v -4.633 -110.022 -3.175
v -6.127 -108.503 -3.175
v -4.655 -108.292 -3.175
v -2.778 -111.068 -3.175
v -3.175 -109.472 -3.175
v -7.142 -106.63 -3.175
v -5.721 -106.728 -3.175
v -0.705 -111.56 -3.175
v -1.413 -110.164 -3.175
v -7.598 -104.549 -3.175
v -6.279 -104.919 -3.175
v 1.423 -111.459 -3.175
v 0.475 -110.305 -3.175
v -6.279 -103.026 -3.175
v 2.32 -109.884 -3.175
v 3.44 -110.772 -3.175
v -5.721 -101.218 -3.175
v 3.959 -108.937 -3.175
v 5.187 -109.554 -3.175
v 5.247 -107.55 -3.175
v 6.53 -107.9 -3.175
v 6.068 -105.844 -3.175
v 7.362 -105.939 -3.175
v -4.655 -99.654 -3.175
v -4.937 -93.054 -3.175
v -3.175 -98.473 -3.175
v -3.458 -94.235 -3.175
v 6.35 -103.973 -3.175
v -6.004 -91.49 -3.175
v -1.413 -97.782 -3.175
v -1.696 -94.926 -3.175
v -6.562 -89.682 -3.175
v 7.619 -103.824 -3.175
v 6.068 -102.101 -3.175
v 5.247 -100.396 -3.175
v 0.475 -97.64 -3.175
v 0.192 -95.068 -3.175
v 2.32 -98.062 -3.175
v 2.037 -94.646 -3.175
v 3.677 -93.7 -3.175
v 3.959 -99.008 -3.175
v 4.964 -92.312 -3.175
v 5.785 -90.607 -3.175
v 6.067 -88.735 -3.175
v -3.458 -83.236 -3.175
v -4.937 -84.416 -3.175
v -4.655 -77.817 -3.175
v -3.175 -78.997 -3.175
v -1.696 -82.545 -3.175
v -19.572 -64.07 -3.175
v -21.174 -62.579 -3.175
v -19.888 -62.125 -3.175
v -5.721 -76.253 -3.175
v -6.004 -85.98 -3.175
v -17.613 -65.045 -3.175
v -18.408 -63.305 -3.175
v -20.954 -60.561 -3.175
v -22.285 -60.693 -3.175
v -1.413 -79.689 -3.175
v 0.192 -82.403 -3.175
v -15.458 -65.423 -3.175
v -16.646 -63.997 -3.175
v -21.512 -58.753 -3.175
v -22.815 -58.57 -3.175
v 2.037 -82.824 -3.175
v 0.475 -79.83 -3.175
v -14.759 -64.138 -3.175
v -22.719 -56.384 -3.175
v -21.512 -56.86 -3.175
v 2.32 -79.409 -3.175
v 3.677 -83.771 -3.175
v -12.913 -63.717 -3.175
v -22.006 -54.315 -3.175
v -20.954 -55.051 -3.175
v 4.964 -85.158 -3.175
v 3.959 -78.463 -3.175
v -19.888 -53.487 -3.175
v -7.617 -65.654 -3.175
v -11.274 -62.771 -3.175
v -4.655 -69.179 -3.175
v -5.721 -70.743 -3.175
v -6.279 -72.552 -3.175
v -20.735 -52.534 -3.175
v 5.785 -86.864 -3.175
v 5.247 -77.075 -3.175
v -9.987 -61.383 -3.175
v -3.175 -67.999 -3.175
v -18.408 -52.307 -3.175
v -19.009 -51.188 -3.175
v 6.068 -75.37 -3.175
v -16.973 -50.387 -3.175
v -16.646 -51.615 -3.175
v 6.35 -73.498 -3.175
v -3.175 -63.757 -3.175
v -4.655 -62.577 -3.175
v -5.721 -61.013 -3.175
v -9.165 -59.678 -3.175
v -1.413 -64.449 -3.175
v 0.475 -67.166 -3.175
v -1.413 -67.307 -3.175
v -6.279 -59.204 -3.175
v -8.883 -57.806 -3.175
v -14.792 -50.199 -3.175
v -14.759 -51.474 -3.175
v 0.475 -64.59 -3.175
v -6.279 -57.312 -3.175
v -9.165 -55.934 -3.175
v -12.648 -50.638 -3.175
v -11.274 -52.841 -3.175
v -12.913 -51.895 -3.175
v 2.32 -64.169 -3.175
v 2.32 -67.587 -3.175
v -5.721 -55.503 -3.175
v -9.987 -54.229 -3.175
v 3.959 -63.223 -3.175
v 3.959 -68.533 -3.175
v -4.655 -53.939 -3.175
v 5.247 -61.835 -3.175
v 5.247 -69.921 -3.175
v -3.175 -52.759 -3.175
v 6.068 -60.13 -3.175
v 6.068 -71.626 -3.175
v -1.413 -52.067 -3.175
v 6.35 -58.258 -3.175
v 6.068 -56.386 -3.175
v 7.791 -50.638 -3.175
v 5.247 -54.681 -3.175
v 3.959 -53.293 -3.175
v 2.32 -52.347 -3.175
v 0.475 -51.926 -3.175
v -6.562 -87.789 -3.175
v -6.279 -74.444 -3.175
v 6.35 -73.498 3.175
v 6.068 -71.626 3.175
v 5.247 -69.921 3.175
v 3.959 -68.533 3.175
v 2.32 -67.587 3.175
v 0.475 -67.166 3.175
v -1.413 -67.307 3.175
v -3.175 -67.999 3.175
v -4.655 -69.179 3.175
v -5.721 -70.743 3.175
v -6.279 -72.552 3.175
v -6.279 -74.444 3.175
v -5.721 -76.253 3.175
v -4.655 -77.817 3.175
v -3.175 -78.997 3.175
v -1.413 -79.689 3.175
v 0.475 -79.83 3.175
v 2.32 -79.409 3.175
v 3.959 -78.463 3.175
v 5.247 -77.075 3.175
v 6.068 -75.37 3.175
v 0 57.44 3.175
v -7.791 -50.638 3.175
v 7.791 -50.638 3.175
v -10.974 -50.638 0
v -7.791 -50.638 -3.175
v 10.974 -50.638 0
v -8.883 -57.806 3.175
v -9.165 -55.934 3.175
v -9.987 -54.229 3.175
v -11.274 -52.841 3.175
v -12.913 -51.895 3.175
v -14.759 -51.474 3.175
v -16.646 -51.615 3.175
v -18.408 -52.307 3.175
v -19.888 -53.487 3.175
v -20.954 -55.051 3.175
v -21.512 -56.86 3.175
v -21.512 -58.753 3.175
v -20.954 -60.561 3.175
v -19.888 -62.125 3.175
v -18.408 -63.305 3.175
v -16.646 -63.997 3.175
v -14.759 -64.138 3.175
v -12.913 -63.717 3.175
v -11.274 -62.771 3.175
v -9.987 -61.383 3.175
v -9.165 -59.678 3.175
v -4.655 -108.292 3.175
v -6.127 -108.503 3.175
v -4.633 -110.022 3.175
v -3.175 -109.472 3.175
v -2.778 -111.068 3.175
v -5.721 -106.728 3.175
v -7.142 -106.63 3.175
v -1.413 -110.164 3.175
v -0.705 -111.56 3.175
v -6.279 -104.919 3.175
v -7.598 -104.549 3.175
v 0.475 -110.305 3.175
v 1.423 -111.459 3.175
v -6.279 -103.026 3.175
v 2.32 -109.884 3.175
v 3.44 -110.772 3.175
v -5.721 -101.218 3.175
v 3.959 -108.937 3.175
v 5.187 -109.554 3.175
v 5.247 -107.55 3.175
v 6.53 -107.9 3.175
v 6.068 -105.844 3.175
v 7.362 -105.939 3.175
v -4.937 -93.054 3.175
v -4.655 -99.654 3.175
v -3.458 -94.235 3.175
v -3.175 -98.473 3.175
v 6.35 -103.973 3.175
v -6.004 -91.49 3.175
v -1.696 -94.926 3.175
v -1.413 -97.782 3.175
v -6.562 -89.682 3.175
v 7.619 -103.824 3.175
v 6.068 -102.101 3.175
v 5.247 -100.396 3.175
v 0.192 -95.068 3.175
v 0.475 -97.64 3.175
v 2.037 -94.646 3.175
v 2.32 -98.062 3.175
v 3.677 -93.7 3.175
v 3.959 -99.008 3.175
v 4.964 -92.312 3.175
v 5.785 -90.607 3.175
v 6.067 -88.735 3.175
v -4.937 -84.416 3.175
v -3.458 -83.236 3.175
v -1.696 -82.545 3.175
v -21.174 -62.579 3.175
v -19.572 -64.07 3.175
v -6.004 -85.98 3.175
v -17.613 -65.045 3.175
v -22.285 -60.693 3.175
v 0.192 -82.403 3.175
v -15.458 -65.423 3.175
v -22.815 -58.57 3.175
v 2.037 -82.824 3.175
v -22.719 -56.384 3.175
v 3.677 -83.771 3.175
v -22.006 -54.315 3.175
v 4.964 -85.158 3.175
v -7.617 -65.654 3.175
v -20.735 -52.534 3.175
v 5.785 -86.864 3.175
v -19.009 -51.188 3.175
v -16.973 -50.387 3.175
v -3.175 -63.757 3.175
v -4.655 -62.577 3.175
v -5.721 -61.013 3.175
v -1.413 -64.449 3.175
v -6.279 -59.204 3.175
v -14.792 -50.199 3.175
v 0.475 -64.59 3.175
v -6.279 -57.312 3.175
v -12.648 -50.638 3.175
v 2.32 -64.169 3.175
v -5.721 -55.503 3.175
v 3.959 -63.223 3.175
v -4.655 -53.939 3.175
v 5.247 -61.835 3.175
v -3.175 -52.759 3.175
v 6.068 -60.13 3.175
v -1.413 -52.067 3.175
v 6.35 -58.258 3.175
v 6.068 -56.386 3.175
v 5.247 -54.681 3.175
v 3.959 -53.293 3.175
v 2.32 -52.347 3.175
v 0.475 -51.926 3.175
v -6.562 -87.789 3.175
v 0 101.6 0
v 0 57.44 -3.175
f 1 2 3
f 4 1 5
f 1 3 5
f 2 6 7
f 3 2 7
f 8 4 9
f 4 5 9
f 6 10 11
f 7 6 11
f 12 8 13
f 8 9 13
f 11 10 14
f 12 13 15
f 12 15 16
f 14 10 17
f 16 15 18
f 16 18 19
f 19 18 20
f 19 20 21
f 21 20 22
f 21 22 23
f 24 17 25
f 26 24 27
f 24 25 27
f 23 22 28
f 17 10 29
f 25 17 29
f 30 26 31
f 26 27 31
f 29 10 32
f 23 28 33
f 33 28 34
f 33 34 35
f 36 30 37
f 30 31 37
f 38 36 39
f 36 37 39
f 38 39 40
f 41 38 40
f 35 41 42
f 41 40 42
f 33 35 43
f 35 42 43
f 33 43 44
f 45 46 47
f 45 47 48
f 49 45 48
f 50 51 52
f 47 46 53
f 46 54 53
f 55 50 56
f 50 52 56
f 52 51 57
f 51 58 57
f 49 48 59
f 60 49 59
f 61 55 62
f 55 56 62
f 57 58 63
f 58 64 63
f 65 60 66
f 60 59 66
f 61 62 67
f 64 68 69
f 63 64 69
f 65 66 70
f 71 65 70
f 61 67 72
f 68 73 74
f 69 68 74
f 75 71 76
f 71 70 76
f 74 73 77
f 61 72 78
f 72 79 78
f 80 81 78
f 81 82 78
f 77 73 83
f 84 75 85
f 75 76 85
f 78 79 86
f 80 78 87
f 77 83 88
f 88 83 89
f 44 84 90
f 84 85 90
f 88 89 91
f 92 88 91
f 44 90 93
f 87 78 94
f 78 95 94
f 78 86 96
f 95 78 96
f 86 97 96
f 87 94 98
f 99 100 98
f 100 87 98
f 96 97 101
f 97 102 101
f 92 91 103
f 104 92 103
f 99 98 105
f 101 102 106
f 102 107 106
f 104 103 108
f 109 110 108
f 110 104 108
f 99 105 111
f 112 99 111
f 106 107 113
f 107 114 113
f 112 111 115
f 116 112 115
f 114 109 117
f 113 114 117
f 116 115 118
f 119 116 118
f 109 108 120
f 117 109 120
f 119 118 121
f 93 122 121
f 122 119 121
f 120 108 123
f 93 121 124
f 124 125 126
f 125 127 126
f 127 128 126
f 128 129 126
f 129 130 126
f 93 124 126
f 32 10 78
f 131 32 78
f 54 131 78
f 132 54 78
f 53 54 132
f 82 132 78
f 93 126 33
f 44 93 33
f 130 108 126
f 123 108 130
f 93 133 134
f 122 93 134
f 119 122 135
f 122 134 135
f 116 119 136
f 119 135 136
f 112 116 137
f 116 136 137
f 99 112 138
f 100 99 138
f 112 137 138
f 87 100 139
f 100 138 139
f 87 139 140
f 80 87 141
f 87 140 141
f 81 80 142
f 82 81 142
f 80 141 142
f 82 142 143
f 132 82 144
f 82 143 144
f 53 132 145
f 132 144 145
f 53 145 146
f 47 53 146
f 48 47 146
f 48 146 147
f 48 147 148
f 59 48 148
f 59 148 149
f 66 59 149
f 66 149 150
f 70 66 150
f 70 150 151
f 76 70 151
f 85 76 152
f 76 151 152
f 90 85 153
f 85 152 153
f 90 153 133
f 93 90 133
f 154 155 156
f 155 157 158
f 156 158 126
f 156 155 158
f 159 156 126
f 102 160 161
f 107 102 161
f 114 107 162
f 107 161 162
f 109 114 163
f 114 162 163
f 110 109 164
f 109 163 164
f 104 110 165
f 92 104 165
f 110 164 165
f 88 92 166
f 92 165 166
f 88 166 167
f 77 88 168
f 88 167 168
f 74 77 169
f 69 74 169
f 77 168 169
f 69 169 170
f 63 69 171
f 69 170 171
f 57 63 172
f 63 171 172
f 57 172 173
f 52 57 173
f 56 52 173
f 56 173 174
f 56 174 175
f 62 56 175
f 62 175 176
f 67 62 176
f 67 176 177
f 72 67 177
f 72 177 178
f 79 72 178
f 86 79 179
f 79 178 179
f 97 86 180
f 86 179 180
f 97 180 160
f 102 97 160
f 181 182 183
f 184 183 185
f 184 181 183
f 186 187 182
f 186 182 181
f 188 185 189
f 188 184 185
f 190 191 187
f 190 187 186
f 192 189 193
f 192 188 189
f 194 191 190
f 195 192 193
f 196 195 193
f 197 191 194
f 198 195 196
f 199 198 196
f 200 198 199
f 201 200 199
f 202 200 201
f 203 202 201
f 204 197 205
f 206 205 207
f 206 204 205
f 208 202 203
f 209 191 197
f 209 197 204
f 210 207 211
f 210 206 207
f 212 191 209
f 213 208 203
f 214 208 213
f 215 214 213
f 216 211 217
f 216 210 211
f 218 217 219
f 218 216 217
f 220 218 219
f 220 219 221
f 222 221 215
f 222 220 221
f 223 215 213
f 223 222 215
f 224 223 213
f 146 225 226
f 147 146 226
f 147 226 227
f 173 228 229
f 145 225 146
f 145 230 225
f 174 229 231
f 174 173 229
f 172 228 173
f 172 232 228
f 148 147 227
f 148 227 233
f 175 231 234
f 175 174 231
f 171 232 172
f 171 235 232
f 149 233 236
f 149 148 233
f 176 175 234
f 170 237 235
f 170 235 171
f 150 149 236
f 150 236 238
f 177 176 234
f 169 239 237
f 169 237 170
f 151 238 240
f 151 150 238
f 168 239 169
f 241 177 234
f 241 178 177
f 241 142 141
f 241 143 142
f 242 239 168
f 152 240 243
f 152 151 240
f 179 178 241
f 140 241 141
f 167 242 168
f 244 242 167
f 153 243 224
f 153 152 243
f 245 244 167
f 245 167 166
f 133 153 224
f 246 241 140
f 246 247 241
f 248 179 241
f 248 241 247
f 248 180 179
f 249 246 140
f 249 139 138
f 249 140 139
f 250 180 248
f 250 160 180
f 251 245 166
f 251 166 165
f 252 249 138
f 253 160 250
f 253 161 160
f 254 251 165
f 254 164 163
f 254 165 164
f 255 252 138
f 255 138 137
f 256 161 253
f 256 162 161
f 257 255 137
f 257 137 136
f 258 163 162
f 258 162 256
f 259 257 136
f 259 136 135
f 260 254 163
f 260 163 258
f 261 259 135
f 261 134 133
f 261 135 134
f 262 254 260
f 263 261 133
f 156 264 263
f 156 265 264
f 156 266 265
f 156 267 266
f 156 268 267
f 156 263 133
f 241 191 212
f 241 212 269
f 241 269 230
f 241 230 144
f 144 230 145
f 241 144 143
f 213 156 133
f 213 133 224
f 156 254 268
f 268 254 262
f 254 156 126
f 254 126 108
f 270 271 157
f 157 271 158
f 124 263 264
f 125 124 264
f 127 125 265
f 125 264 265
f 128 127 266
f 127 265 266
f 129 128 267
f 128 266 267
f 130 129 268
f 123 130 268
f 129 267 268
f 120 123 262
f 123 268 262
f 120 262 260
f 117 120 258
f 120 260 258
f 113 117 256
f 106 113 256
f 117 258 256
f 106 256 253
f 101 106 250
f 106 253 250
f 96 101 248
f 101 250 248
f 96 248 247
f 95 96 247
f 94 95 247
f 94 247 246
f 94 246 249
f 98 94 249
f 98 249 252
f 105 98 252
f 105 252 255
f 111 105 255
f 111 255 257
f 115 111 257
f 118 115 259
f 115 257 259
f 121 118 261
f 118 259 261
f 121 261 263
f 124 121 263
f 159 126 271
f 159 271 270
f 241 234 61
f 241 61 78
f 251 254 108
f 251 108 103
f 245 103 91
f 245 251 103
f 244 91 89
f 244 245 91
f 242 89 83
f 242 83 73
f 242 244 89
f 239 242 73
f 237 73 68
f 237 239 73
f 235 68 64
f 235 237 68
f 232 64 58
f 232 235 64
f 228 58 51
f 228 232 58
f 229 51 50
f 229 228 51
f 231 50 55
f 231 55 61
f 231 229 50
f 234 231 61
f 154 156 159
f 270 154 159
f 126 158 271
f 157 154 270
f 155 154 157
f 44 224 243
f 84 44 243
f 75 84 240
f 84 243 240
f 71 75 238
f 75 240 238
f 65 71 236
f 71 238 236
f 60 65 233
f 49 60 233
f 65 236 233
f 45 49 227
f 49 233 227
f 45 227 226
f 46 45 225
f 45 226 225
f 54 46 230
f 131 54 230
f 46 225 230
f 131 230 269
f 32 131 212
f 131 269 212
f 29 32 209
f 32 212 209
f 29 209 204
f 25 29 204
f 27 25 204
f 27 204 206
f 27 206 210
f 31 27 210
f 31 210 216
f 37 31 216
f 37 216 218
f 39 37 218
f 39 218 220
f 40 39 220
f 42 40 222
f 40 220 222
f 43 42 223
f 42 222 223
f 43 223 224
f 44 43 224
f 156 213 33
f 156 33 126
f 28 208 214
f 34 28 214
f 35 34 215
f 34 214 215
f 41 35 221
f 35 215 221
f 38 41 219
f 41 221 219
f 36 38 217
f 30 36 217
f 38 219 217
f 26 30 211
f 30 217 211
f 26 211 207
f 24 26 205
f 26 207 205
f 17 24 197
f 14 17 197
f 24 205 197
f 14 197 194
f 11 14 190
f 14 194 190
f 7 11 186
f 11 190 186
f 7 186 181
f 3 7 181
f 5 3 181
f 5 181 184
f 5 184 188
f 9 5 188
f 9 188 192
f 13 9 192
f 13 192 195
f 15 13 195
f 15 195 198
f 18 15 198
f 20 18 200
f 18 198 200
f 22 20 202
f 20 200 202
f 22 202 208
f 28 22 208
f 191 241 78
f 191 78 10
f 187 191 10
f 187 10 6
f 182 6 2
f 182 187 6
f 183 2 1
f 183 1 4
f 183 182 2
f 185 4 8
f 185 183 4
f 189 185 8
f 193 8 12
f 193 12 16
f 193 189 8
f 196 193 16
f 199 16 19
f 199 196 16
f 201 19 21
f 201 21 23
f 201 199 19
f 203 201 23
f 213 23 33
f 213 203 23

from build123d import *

# Parameters (mm, degrees)
F1_DEPTH = 3.175
F2_SIZE  = 3.17499
F3_R     = 6.35
F4_DEPTH = 6.35


# Not quite as in the source:
# - a fillet or chamfer is up to 0.001 mm smaller than in the source, because OpenCascade refuses the exact size
# - ends of sketch curves that miss each other by under 0.0002 mm in the source are joined
# - a feature names something its author has since deleted; it is built from what else it names


with BuildPart() as f1:
    # F0 (on Top) → F1 (new body, symmetric)
    with BuildSketch(Plane.XY):
        Polygon((0, 101.6), (-10.9740330666, -50.6379564073), (10.9740330666, -50.6379564073), align=None)
    extrude(amount=F1_DEPTH, both=True)

    # F2 (size 3.175 in the source; OpenCascade refuses exactly that, so slightly less here)
    f2_edges = [f1.edges().sort_by_distance(p)[0] for p in [
        (5.487017, 25.481022, 3.175),
        (-5.487017, 25.481022, 3.175),
        (5.487017, 25.481022, -3.175),
        (-5.487017, 25.481022, -3.175),
    ]]
    chamfer(f2_edges, length=F2_SIZE)


with BuildPart() as f4:
    # F3 (on face) → F4 (new body)
    with BuildSketch(Plane.XY.offset(3.175)):
        with BuildLine():
            Line((-7.6165116267, -65.6536943669), (-7.5981611835, -104.5492119633))
            ThreePointArc((-7.5981611835, -104.5492119633), (0.3625233188, -111.5840883864), (7.6185574498, -103.8244522658))
            Line((7.6185574498, -103.8244522658), (7.7907947724, -50.6379564073))
            Line((7.7907947724, -50.6379564073), (0, -50.6379564073))
            Line((0, -50.6379564073), (-7.7908047984, -50.6379564073))
            Line((-7.7908047984, -50.6379564073), (-12.6483816852, -50.6379564073))
            ThreePointArc((-12.6483816852, -50.6379564073), (-22.7193690915, -56.3837372477), (-15.4575681017, -65.4228207847))
            Line((-15.4575681017, -65.4228207847), (-7.6165116267, -65.6536943669))
        make_face()
        with Locations((-15.2333005435, -57.806121758)):
            Circle(F3_R, mode=Mode.SUBTRACT)
        with BuildLine():
            ThreePointArc((-7.6200625985, -58.1270703408), (-7.6182081929, -58.0795600348), (-7.6166502718, -58.0320390827))
            ThreePointArc((-7.6166502718, -58.0320390827), (-7.6191889591, -58.1467826471), (-7.619999152, -58.2615514324))
            Line((-7.619999152, -58.2615514324), (-7.6200625985, -58.1270703408))
        make_face(mode=Mode.SUBTRACT)
        with Locations((0, -103.9727168383)):
            Circle(F3_R, mode=Mode.SUBTRACT)
        with Locations((-0.2825671034, -88.7353366228)):
            Circle(F3_R, mode=Mode.SUBTRACT)
        with Locations((0, -73.4979564073)):
            Circle(F3_R, mode=Mode.SUBTRACT)
        with Locations((0, -58.2579564073)):
            Circle(F3_R, mode=Mode.SUBTRACT)
        with BuildLine():
            ThreePointArc((-7.619999152, -58.2615514324), (-7.6191889591, -58.1467826471), (-7.6166502718, -58.0320390827))
            ThreePointArc((-7.6166502718, -58.0320390827), (-7.6182081929, -58.0795600348), (-7.6200625985, -58.1270703408))
            Line((-7.6200625985, -58.1270703408), (-7.619999152, -58.2615514324))
        make_face()
    extrude(amount=-F4_DEPTH)


solid = Compound([f1.part, f4.part])
